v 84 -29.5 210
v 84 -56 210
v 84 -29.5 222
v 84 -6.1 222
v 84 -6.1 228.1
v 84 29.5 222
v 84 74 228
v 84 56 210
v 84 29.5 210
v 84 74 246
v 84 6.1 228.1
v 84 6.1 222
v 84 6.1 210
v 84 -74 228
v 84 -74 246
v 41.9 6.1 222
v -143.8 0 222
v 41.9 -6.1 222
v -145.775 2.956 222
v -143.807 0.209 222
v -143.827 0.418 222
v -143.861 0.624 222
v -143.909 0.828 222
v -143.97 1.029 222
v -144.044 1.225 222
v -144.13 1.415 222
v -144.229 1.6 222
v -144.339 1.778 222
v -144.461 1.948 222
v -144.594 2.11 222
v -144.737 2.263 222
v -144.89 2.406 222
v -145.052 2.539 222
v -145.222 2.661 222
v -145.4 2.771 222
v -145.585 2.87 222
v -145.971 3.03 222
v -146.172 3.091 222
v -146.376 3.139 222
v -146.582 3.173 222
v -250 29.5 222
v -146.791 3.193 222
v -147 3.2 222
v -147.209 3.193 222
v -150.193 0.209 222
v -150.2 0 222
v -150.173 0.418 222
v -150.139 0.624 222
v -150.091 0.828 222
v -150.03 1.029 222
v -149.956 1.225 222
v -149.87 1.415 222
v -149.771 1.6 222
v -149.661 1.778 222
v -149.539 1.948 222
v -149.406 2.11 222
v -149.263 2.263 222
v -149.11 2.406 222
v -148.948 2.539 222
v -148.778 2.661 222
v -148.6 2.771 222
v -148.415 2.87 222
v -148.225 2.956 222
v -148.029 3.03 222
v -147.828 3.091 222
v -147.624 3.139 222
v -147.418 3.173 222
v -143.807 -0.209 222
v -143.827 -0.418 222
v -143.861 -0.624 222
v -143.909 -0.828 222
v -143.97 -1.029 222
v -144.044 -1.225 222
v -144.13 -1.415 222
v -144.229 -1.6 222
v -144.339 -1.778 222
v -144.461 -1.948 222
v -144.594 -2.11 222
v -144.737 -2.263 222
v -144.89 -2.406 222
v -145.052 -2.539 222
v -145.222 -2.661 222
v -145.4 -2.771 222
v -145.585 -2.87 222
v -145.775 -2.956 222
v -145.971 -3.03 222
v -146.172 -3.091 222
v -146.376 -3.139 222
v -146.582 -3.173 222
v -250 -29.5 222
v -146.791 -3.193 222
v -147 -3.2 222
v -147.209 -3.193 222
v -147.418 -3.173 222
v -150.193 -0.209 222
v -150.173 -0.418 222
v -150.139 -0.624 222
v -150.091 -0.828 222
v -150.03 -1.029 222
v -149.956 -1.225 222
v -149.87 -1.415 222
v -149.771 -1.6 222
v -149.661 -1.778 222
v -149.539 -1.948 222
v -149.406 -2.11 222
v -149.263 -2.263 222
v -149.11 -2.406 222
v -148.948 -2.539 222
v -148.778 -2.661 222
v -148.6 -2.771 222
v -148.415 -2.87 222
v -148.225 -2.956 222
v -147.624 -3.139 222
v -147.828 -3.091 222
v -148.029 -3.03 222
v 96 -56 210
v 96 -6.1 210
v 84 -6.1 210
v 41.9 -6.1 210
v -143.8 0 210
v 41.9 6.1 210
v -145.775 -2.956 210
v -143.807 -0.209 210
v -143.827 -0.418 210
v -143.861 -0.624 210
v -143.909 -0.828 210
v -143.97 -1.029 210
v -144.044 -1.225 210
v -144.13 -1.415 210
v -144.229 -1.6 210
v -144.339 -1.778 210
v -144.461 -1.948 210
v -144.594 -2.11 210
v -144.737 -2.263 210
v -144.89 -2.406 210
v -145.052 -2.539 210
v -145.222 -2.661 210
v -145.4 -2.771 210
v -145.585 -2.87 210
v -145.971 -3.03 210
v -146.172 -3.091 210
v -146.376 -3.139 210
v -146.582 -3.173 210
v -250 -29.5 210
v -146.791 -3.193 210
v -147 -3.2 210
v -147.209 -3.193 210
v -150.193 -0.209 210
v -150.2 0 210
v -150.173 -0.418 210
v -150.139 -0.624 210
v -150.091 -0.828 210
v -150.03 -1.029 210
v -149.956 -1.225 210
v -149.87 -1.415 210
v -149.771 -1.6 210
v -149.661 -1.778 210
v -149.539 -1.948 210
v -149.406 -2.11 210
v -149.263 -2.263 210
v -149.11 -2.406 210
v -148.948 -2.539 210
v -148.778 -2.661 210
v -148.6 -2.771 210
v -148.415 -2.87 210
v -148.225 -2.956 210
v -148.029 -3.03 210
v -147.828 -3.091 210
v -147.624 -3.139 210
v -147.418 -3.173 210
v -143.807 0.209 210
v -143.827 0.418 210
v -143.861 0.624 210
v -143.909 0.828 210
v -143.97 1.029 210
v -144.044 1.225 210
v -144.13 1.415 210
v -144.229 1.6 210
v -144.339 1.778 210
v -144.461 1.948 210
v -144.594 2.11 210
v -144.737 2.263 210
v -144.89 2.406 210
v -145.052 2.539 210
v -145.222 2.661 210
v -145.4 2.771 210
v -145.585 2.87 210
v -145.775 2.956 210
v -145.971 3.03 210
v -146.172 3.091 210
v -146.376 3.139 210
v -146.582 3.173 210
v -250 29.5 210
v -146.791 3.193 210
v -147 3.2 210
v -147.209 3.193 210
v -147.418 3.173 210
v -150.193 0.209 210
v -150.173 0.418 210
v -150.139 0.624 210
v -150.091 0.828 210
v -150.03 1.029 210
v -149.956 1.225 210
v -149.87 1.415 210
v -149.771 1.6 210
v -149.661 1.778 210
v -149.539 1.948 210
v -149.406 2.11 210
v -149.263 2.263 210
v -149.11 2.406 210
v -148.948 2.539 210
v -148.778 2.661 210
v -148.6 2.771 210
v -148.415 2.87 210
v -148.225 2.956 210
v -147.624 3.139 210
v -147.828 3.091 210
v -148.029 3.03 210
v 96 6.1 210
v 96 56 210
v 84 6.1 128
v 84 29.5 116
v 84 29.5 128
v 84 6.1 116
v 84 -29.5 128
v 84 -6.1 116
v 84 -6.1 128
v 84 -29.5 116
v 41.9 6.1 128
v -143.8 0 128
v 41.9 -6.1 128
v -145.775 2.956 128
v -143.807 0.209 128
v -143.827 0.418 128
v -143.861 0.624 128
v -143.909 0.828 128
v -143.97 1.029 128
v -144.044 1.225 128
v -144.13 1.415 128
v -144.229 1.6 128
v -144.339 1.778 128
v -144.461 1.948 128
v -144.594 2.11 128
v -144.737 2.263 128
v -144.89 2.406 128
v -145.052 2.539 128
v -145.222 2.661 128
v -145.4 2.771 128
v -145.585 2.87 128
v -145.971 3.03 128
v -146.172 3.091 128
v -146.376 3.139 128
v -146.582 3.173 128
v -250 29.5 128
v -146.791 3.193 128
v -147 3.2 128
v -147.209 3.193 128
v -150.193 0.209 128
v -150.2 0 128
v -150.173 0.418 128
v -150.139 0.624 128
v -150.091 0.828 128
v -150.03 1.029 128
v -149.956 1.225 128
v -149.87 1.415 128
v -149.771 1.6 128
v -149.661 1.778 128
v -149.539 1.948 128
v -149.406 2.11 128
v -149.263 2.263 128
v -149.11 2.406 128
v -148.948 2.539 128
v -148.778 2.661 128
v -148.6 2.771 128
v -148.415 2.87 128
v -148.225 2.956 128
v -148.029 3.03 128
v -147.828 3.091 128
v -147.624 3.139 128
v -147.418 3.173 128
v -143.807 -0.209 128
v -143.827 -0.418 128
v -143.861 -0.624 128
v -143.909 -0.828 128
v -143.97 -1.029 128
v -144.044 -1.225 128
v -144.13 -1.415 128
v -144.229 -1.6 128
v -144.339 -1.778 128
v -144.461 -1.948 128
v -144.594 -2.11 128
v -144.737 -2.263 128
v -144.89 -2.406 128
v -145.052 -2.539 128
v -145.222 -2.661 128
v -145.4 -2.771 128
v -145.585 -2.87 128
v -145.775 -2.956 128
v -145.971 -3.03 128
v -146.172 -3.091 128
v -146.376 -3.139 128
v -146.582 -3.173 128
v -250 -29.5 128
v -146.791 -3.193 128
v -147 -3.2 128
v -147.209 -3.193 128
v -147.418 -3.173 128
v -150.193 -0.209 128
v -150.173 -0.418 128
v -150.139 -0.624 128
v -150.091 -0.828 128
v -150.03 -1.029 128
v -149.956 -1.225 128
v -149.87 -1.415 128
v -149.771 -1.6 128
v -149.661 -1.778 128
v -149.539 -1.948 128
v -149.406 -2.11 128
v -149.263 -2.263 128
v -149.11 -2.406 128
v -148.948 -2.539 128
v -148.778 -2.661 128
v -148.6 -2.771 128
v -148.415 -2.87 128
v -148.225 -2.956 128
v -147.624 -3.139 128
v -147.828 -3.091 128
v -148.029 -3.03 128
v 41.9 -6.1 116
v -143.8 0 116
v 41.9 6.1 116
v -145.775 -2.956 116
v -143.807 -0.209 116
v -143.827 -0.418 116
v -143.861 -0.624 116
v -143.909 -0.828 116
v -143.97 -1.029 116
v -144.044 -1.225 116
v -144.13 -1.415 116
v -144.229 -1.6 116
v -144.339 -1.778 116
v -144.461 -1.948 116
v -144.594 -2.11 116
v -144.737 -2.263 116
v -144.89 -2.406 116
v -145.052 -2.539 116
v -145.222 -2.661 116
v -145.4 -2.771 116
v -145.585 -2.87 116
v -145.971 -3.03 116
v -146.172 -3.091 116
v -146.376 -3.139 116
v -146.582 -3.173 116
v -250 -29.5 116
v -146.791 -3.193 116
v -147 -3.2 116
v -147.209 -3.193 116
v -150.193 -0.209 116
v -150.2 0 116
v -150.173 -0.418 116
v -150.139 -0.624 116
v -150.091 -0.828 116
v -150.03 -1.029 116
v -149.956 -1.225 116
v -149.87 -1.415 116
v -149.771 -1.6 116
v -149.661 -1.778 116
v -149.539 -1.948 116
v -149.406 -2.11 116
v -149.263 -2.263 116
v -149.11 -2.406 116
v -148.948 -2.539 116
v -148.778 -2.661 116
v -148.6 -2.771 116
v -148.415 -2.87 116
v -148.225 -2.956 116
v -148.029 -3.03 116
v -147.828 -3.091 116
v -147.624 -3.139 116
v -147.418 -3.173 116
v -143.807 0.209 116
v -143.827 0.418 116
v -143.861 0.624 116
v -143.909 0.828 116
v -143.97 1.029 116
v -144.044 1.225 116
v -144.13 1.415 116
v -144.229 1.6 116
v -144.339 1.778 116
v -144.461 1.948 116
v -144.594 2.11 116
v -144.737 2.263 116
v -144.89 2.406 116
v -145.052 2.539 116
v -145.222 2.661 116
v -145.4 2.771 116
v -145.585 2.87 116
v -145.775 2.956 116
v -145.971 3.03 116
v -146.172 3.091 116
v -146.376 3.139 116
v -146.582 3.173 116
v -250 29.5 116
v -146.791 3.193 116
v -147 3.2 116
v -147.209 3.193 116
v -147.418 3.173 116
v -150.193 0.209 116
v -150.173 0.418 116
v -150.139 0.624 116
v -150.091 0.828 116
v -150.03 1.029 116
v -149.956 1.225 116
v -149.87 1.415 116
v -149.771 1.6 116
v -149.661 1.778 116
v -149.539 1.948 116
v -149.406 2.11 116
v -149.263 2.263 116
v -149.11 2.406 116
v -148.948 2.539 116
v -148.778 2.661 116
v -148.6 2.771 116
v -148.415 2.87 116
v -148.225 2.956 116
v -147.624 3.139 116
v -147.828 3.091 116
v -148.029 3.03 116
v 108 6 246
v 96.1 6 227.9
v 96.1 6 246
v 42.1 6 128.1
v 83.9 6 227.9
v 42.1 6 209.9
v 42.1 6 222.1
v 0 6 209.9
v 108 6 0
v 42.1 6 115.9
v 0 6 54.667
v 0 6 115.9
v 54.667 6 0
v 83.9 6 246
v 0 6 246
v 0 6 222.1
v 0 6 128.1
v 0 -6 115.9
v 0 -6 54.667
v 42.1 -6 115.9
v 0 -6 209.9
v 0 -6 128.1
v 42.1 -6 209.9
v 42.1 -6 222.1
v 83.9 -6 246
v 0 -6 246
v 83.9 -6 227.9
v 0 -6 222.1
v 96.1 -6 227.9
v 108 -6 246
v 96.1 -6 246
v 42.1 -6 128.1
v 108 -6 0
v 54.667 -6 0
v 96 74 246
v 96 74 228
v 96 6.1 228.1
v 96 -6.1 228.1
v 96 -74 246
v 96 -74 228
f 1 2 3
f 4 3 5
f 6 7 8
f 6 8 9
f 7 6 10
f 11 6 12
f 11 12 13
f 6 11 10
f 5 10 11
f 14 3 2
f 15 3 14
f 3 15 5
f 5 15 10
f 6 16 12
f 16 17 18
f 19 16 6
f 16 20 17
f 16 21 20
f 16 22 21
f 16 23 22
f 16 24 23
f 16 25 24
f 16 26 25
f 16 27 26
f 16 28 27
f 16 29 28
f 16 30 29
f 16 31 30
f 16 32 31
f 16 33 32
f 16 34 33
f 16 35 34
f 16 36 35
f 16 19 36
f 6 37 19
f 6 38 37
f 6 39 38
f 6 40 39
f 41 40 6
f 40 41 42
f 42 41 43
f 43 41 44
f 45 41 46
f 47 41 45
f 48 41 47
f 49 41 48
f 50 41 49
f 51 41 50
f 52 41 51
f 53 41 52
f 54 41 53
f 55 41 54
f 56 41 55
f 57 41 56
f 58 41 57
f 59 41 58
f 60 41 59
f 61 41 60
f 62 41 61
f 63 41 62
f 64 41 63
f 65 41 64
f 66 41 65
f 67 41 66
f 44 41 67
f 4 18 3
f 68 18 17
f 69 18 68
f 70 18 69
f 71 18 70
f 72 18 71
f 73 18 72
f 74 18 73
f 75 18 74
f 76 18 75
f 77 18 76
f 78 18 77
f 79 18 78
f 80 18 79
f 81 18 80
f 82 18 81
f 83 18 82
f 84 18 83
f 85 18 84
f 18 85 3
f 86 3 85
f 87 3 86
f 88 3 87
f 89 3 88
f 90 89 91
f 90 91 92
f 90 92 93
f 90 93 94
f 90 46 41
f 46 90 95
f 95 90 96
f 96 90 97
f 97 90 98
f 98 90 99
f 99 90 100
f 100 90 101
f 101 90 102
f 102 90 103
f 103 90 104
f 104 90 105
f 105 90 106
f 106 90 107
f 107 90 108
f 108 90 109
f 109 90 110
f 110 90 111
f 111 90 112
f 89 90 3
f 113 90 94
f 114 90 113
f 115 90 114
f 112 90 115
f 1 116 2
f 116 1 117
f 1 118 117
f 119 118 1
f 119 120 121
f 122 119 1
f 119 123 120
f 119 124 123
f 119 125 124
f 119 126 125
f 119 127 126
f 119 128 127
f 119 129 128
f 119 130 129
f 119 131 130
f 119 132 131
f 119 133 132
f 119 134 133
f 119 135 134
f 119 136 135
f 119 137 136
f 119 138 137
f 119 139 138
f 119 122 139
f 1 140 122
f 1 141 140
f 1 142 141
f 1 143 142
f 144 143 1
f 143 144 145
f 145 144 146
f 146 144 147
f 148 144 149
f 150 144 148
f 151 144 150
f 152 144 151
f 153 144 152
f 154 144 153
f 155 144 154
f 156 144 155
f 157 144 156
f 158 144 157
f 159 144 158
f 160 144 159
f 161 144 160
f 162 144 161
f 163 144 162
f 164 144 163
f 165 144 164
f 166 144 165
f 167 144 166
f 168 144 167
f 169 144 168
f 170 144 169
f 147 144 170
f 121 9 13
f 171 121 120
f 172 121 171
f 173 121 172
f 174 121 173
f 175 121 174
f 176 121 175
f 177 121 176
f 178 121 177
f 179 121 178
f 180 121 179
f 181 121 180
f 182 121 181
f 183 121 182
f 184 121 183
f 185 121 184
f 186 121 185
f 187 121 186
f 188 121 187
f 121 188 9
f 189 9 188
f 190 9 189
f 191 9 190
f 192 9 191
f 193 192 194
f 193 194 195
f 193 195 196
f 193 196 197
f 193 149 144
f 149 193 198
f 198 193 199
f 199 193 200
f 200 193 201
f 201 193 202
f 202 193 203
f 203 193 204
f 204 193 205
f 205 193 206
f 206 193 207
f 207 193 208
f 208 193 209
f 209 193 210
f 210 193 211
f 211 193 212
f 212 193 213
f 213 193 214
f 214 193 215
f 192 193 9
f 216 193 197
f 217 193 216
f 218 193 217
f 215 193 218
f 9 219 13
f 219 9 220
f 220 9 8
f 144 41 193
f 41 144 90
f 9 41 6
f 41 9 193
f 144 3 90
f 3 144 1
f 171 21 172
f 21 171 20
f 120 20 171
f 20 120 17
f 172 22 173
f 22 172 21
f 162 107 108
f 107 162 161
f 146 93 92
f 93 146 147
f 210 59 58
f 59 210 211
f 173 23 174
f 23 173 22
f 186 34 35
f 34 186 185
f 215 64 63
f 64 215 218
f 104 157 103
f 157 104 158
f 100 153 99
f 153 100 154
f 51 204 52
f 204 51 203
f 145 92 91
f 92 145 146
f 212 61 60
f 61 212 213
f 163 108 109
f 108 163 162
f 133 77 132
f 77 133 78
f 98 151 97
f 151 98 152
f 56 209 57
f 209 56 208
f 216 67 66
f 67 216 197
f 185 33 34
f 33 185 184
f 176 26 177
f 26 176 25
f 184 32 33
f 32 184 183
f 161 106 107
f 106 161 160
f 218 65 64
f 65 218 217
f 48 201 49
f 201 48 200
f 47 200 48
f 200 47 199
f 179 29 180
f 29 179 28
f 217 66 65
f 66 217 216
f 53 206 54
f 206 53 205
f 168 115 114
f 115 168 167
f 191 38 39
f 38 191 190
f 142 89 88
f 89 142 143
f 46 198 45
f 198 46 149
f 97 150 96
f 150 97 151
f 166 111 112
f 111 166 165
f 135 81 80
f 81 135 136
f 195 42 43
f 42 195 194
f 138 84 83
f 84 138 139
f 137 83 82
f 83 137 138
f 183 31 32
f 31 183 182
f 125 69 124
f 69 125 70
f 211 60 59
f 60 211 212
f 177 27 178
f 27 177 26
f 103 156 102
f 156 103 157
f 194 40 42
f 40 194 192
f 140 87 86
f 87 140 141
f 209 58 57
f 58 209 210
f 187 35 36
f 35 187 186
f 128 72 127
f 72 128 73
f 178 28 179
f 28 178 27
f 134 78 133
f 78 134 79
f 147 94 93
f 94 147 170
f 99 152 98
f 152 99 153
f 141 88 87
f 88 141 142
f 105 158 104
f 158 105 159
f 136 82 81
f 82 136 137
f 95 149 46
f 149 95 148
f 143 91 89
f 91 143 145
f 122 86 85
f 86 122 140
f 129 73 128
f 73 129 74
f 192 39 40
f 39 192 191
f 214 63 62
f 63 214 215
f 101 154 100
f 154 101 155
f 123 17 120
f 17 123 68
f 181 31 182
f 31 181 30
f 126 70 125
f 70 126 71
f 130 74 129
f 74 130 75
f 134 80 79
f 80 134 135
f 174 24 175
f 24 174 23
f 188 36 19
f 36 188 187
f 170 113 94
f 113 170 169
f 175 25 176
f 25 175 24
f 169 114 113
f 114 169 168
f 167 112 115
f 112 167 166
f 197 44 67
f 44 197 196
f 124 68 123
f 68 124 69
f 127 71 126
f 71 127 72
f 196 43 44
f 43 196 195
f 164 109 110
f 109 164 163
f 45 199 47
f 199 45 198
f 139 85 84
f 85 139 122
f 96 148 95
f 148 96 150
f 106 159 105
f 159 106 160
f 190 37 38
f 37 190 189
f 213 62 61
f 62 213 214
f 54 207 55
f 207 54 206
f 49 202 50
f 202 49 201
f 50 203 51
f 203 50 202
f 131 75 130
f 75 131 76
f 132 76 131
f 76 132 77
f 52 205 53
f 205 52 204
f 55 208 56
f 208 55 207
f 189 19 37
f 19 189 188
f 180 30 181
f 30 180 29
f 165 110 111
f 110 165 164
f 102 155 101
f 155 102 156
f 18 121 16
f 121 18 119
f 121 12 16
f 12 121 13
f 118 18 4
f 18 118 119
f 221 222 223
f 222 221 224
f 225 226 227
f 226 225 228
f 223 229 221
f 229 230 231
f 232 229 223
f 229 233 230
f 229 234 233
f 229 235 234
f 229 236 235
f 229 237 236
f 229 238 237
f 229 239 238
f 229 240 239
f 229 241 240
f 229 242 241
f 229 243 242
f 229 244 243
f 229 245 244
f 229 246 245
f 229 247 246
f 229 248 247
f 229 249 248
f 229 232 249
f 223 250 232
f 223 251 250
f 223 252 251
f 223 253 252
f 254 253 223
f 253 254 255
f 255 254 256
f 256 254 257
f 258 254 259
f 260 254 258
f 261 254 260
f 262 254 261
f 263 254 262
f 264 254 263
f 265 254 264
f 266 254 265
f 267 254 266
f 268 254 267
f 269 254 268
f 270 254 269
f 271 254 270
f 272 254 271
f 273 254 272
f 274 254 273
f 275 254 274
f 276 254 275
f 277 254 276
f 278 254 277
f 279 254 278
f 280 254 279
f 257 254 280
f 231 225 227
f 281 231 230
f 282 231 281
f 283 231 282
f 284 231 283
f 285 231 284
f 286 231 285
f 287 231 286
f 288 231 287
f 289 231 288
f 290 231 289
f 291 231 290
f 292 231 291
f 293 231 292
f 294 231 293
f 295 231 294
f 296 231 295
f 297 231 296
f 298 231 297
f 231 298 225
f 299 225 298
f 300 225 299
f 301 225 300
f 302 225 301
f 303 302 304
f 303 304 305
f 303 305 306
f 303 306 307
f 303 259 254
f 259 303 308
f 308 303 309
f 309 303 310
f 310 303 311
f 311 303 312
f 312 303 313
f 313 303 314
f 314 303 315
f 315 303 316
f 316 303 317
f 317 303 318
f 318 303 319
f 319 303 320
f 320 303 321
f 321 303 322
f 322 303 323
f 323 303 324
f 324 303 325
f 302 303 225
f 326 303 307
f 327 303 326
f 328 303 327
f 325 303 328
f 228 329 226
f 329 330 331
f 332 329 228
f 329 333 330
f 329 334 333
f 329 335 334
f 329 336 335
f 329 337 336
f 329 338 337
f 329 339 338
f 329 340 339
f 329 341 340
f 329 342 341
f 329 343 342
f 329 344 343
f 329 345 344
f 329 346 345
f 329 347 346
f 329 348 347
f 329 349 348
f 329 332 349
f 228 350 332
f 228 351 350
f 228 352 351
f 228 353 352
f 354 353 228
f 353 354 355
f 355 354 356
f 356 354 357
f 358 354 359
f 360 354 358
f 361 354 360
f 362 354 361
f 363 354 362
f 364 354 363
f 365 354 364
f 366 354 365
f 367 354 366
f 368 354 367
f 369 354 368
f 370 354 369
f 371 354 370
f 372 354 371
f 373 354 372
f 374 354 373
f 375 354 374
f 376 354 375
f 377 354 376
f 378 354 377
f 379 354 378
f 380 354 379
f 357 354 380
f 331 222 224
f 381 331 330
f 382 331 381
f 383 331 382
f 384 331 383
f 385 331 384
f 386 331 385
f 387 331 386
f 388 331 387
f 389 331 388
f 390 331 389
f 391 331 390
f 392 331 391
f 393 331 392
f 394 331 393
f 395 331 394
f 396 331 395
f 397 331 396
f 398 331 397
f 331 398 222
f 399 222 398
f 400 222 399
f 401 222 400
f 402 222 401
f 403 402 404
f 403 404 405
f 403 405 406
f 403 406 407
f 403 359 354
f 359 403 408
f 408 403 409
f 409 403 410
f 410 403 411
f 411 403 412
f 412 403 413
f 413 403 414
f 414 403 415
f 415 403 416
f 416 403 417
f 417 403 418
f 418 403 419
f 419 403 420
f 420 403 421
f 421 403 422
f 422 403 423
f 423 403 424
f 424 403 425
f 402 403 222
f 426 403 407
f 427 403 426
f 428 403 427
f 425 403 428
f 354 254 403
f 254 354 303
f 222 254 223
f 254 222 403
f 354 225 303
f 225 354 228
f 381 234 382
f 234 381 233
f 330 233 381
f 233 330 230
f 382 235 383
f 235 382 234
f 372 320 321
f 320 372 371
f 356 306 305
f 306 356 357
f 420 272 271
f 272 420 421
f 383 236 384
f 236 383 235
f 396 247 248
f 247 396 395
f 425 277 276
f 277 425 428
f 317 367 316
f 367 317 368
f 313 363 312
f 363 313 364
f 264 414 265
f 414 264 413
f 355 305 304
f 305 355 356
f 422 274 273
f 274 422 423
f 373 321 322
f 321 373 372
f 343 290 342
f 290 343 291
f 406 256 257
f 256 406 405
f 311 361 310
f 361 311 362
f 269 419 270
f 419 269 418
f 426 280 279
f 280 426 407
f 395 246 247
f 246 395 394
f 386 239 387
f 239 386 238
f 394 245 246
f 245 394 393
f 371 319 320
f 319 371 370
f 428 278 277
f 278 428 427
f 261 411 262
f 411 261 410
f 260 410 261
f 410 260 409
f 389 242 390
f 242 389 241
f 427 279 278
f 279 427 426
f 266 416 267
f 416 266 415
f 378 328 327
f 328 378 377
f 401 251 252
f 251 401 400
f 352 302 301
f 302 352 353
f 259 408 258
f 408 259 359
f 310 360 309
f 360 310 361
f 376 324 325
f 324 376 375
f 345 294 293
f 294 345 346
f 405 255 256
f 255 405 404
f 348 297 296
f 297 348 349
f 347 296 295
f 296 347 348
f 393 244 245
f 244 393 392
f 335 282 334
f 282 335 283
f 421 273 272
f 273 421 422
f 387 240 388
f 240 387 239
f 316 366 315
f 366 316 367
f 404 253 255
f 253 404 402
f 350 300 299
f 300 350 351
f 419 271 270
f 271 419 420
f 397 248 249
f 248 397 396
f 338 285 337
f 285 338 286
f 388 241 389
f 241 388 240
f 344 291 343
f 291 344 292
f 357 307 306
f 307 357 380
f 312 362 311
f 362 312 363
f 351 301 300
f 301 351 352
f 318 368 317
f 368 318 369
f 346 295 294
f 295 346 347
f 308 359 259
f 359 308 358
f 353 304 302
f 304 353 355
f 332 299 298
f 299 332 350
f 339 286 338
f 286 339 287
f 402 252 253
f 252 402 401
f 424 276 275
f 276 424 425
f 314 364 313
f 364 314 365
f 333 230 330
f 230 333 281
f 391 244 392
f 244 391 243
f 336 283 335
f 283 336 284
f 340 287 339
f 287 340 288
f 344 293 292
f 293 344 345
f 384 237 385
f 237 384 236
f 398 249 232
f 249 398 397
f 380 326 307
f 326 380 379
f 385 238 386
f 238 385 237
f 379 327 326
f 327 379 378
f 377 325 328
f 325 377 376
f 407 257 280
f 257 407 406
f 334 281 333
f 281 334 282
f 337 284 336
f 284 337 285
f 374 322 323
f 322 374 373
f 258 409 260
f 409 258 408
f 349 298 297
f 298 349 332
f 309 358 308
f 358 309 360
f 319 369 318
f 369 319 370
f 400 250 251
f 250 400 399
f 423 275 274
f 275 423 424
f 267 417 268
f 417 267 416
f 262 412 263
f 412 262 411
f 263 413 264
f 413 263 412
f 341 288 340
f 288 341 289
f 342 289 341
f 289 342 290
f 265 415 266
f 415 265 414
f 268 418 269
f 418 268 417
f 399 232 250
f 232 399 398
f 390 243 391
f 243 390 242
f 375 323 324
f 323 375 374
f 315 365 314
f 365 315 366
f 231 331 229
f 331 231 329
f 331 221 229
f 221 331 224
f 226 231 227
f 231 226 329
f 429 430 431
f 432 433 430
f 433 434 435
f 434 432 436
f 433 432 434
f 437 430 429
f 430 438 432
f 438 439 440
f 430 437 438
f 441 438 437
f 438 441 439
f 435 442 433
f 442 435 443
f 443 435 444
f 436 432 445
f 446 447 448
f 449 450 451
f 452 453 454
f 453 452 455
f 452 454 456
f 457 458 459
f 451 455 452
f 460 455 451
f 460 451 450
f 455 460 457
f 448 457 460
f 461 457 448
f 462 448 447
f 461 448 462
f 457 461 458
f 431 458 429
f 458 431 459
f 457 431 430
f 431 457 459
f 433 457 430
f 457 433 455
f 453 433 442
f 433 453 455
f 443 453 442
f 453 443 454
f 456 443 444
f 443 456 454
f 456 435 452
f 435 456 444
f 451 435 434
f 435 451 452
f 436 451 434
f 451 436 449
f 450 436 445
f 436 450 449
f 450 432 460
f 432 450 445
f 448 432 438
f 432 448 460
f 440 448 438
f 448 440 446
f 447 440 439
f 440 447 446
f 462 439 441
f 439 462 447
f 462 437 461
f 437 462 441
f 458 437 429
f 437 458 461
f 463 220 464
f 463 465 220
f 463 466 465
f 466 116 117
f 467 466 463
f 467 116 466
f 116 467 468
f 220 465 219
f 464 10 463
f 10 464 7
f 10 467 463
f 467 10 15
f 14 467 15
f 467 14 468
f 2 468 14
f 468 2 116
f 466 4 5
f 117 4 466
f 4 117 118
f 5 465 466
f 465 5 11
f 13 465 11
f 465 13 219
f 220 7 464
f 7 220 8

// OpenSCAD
// file: ../../lib/rear_fin.scad
// ==========================================================================
//  Turtle Body -- rear fin + solar-panel support  (lib module)
// --------------------------------------------------------------------------
//  One yellow vertical fin, two green bottle-holder shafts, one red solar
//  crossbar. In the standalone the panel + bottle are %-reference only and
//  excluded from F6/STL. See CLAUDE.md s11.
//
//  Shaft length keeps the approved formula 305 + (2/3)(93-24) - 17 = 334.
//  Half-lap and solar-joint clearances are 0.2 mm TOTAL, centred on the
//  12 mm board (slot opening 12.2 mm, not 12.4). TB-07: the green-slat
//  mounting hole is p_rear_shaft_hole_from_front() (103 mm at defaults),
//  matching the assembled Turtle -- not the old fixed 50 mm.
//
//  Definitions only. Geometry is emitted by rear_fin_assembly() or the
//  individual part modules.
// ==========================================================================

use <params.scad>

function rf_t()             = p_wood_t();
function rf_fin_width()     = p_fin_board_w() + p_rear_fin_tab_width();          // 108
function rf_fin_height()    = 3 * p_bottle_d();                                  // 246
function rf_diag()          = (2/3) * p_bottle_d();                              // 54.667
function rf_shaft_length()  = p_rear_shaft_len();                               // 334
function rf_shaft_width()   = p_rear_shaft_width();                             // 59
function rf_solar_holder_len() = p_solar_panel_w();                            // 148
function rf_solar_holder_h()   = 3 * rf_t();                                    // 36
function rf_solar_chamfer()    = 1.5 * rf_t();                                  // 18
function rf_solar_slot_depth() = rf_solar_holder_h() / 2;                       // 18
function rf_solar_notch_x0()   = rf_fin_width() - 2 * rf_t();                    // 84
function rf_shaft_rear_x()     = rf_solar_notch_x0();                            // 84
function rf_shaft_front_x()    = rf_shaft_rear_x() - rf_shaft_length();
function rf_joint_meet_x()     = rf_shaft_rear_x() / 2;
function rf_upper_shaft_z0()   = rf_fin_height() - 3 * rf_t();
function rf_lower_shaft_z0()   = rf_upper_shaft_z0() - p_bottle_d() - rf_t();
function rf_solar_meet_z()     = rf_upper_shaft_z0() + rf_solar_slot_depth();

module rf_assert_valid(half_lap, solar_clear, hole_from_front, hole_d) {
    t = rf_t();
    assert(t > 0 && p_bottle_h() > p_bottle_cap_h() && p_bottle_cap_d() > 0);
    assert(p_bottle_d() > 0 && p_fin_board_w() > 2 * t && p_rear_fin_tab_width() > 0);
    assert(p_solar_panel_w() > 0 && p_solar_panel_h() > 0 && p_solar_panel_t() > 0);
    assert(half_lap >= 0 && solar_clear >= 0);
    assert(rf_shaft_front_x() < 0 && rf_joint_meet_x() > half_lap / 2);
    assert(rf_shaft_width() > t + half_lap);
    assert(half_lap < t && half_lap < p_bottle_d());
    assert(rf_lower_shaft_z0() - half_lap / 2 >= rf_diag(),
           "rear_fin: lower joint intersects the diagonal fin edge.");
    assert(rf_fin_width() > rf_diag());
    assert(solar_clear < t && rf_solar_notch_x0() > solar_clear / 2);
    assert(2 * rf_solar_chamfer() + t + solar_clear < rf_solar_holder_len(),
           "rear_fin: panel width leaves too little red-board material beside the slot.");
    assert(hole_d > 0 && rf_shaft_width() > hole_d);
    assert(hole_from_front > hole_d / 2
           && rf_shaft_front_x() + hole_from_front + hole_d / 2 < 0,
           "rear_fin: shaft hole must stay in the forward, unjointed portion.");
}

module rear_fin(half_lap = p_fit_clearance(), solar_clear = p_fit_clearance(),
                fn = undef) {
    t = rf_t(); eps = p_eps();
    nn = fn == undef ? p_fn_wood() : fn;
    color([1, 0.72, 0.05]) rotate([90, 0, 0])
        linear_extrude(height = t, center = true, $fn = nn) difference() {
            polygon([[0, rf_diag()], [rf_diag(), 0],
                     [rf_fin_width(), 0], [rf_fin_width(), rf_fin_height()],
                     [0, rf_fin_height()]]);
            for (z = [rf_upper_shaft_z0(), rf_lower_shaft_z0()])
                translate([-eps, z - half_lap / 2])
                    square([rf_joint_meet_x() + half_lap / 2 + eps, t + half_lap]);
            translate([rf_solar_notch_x0() - solar_clear / 2,
                       rf_solar_meet_z() - solar_clear / 2])
                square([t + solar_clear,
                        rf_fin_height() - rf_solar_meet_z() + solar_clear / 2 + eps]);
        }
}

module bottle_holder_shaft(z0 = 0, half_lap = p_fit_clearance(),
                           hole_from_front = undef, hole_d = undef, fn = undef) {
    t = rf_t(); eps = p_eps();
    nn  = fn == undef ? p_fn_wood() : fn;
    hff = hole_from_front == undef ? p_rear_shaft_hole_from_front() : hole_from_front;
    hd  = hole_d == undef ? p_m6_clearance_d() : hole_d;
    color([0.2, 0.38, 0.05]) difference() {
        translate([rf_shaft_front_x(), -rf_shaft_width() / 2, z0])
            cube([rf_shaft_length(), rf_shaft_width(), t]);
        translate([rf_shaft_front_x() + hff, 0, z0 - eps])
            cylinder(d = hd, h = t + 2 * eps, $fn = nn);
        translate([rf_joint_meet_x() - half_lap / 2, -(t + half_lap) / 2, z0 - eps])
            cube([rf_shaft_rear_x() - rf_joint_meet_x() + half_lap / 2 + eps,
                  t + half_lap, t + 2 * eps]);
    }
}

module solar_panel_holder(solar_clear = p_fit_clearance(), fn = undef) {
    t = rf_t(); eps = p_eps();
    nn = fn == undef ? p_fn_wood() : fn;
    L = rf_solar_holder_len(); H = rf_solar_holder_h(); ch = rf_solar_chamfer();
    color("red") translate([rf_solar_notch_x0(), 0, rf_upper_shaft_z0()])
        rotate([90, 0, 90]) translate([-L / 2, 0, 0])
            linear_extrude(height = t, $fn = nn) difference() {
                square([L, H]);
                polygon([[0, 0], [ch, 0], [0, ch]]);
                polygon([[L, 0], [L - ch, 0], [L, ch]]);
                translate([(L - t - solar_clear) / 2, -eps])
                    square([t + solar_clear, rf_solar_slot_depth() + solar_clear / 2 + eps]);
            }
}

module rear_fin_assembly(half_lap = p_fit_clearance(), solar_clear = p_fit_clearance(),
                         exploded = 0, fn = undef) {
    rf_assert_valid(half_lap, solar_clear,
                    p_rear_shaft_hole_from_front(), p_m6_clearance_d());
    rear_fin(half_lap, solar_clear, fn);
    translate([-exploded, 0,  exploded]) bottle_holder_shaft(rf_upper_shaft_z0(), half_lap, fn = fn);
    translate([-exploded, 0, -exploded]) bottle_holder_shaft(rf_lower_shaft_z0(), half_lap, fn = fn);
    translate([ exploded, 0,  exploded]) solar_panel_holder(solar_clear, fn);

    echo("REAR FIN: shaft length = ", rf_shaft_length(),
         " | hole from front (TB-07) = ", p_rear_shaft_hole_from_front(),
         " | slot opening = ", rf_t() + half_lap);
}
// main file
/*
 Hope Turtle rear-fin v2. Units: mm. License: CERN-OHL-S-2.0.
 Four wooden pieces: yellow fin, two green bottle-holder shafts, red solar
 crossbar. Panel + bottle are F5 reference only, excluded from F6/STL.
 Shaft length 334. Slot openings 12.2 mm (0.2 mm TOTAL, centred).
 TB-07: green-slat mounting hole is 103 mm from the shaft front, matching
 the assembled Turtle (was a fixed 50 mm).

 SOURCE FILE — geometry lives in lib/rear_fin.scad + lib/params.scad.
 The committed self-contained file is generated by build/build.py.
*/

/* [Fit and tuning] */
half_lap_clearance   = 0.2; // TOTAL extra slot width, centred on the board
solar_slot_clearance = 0.2;
exploded = 0;

/* [Display] */
part = "assembly"; // [assembly,fin,solar_holder,shaft]
show_solar_panel = true;   // F5 reference only, excluded from F6/STL
show_bottle_mockup = false; // reserved

/* [Render] */
fn = 96;

use <../../lib/rear_fin.scad>
use <../../lib/params.scad>

module _panel_reference() {
    // width -> Y, height/length -> X, thickness -> Z; extends forward from the crossbar
    x0 = rf_solar_notch_x0() + p_wood_t() - p_solar_panel_h();
    color([0.05, 0.16, 0.4, 0.65])
        translate([x0, -p_solar_panel_w() / 2, rf_fin_height()])
            cube([p_solar_panel_h(), p_solar_panel_w(), p_solar_panel_t()]);
}

if (part == "assembly") {
    rear_fin_assembly(half_lap = half_lap_clearance,
                      solar_clear = solar_slot_clearance,
                      exploded = exploded, fn = fn);
    if (show_solar_panel && exploded == 0) %_panel_reference();
} else if (part == "fin") {
    rear_fin(half_lap = half_lap_clearance, solar_clear = solar_slot_clearance, fn = fn);
} else if (part == "solar_holder") {
    solar_panel_holder(solar_clear = solar_slot_clearance, fn = fn);
} else if (part == "shaft") {
    bottle_holder_shaft(half_lap = half_lap_clearance, fn = fn);
} else {
    assert(false, str("Unknown part: ", part));
}
